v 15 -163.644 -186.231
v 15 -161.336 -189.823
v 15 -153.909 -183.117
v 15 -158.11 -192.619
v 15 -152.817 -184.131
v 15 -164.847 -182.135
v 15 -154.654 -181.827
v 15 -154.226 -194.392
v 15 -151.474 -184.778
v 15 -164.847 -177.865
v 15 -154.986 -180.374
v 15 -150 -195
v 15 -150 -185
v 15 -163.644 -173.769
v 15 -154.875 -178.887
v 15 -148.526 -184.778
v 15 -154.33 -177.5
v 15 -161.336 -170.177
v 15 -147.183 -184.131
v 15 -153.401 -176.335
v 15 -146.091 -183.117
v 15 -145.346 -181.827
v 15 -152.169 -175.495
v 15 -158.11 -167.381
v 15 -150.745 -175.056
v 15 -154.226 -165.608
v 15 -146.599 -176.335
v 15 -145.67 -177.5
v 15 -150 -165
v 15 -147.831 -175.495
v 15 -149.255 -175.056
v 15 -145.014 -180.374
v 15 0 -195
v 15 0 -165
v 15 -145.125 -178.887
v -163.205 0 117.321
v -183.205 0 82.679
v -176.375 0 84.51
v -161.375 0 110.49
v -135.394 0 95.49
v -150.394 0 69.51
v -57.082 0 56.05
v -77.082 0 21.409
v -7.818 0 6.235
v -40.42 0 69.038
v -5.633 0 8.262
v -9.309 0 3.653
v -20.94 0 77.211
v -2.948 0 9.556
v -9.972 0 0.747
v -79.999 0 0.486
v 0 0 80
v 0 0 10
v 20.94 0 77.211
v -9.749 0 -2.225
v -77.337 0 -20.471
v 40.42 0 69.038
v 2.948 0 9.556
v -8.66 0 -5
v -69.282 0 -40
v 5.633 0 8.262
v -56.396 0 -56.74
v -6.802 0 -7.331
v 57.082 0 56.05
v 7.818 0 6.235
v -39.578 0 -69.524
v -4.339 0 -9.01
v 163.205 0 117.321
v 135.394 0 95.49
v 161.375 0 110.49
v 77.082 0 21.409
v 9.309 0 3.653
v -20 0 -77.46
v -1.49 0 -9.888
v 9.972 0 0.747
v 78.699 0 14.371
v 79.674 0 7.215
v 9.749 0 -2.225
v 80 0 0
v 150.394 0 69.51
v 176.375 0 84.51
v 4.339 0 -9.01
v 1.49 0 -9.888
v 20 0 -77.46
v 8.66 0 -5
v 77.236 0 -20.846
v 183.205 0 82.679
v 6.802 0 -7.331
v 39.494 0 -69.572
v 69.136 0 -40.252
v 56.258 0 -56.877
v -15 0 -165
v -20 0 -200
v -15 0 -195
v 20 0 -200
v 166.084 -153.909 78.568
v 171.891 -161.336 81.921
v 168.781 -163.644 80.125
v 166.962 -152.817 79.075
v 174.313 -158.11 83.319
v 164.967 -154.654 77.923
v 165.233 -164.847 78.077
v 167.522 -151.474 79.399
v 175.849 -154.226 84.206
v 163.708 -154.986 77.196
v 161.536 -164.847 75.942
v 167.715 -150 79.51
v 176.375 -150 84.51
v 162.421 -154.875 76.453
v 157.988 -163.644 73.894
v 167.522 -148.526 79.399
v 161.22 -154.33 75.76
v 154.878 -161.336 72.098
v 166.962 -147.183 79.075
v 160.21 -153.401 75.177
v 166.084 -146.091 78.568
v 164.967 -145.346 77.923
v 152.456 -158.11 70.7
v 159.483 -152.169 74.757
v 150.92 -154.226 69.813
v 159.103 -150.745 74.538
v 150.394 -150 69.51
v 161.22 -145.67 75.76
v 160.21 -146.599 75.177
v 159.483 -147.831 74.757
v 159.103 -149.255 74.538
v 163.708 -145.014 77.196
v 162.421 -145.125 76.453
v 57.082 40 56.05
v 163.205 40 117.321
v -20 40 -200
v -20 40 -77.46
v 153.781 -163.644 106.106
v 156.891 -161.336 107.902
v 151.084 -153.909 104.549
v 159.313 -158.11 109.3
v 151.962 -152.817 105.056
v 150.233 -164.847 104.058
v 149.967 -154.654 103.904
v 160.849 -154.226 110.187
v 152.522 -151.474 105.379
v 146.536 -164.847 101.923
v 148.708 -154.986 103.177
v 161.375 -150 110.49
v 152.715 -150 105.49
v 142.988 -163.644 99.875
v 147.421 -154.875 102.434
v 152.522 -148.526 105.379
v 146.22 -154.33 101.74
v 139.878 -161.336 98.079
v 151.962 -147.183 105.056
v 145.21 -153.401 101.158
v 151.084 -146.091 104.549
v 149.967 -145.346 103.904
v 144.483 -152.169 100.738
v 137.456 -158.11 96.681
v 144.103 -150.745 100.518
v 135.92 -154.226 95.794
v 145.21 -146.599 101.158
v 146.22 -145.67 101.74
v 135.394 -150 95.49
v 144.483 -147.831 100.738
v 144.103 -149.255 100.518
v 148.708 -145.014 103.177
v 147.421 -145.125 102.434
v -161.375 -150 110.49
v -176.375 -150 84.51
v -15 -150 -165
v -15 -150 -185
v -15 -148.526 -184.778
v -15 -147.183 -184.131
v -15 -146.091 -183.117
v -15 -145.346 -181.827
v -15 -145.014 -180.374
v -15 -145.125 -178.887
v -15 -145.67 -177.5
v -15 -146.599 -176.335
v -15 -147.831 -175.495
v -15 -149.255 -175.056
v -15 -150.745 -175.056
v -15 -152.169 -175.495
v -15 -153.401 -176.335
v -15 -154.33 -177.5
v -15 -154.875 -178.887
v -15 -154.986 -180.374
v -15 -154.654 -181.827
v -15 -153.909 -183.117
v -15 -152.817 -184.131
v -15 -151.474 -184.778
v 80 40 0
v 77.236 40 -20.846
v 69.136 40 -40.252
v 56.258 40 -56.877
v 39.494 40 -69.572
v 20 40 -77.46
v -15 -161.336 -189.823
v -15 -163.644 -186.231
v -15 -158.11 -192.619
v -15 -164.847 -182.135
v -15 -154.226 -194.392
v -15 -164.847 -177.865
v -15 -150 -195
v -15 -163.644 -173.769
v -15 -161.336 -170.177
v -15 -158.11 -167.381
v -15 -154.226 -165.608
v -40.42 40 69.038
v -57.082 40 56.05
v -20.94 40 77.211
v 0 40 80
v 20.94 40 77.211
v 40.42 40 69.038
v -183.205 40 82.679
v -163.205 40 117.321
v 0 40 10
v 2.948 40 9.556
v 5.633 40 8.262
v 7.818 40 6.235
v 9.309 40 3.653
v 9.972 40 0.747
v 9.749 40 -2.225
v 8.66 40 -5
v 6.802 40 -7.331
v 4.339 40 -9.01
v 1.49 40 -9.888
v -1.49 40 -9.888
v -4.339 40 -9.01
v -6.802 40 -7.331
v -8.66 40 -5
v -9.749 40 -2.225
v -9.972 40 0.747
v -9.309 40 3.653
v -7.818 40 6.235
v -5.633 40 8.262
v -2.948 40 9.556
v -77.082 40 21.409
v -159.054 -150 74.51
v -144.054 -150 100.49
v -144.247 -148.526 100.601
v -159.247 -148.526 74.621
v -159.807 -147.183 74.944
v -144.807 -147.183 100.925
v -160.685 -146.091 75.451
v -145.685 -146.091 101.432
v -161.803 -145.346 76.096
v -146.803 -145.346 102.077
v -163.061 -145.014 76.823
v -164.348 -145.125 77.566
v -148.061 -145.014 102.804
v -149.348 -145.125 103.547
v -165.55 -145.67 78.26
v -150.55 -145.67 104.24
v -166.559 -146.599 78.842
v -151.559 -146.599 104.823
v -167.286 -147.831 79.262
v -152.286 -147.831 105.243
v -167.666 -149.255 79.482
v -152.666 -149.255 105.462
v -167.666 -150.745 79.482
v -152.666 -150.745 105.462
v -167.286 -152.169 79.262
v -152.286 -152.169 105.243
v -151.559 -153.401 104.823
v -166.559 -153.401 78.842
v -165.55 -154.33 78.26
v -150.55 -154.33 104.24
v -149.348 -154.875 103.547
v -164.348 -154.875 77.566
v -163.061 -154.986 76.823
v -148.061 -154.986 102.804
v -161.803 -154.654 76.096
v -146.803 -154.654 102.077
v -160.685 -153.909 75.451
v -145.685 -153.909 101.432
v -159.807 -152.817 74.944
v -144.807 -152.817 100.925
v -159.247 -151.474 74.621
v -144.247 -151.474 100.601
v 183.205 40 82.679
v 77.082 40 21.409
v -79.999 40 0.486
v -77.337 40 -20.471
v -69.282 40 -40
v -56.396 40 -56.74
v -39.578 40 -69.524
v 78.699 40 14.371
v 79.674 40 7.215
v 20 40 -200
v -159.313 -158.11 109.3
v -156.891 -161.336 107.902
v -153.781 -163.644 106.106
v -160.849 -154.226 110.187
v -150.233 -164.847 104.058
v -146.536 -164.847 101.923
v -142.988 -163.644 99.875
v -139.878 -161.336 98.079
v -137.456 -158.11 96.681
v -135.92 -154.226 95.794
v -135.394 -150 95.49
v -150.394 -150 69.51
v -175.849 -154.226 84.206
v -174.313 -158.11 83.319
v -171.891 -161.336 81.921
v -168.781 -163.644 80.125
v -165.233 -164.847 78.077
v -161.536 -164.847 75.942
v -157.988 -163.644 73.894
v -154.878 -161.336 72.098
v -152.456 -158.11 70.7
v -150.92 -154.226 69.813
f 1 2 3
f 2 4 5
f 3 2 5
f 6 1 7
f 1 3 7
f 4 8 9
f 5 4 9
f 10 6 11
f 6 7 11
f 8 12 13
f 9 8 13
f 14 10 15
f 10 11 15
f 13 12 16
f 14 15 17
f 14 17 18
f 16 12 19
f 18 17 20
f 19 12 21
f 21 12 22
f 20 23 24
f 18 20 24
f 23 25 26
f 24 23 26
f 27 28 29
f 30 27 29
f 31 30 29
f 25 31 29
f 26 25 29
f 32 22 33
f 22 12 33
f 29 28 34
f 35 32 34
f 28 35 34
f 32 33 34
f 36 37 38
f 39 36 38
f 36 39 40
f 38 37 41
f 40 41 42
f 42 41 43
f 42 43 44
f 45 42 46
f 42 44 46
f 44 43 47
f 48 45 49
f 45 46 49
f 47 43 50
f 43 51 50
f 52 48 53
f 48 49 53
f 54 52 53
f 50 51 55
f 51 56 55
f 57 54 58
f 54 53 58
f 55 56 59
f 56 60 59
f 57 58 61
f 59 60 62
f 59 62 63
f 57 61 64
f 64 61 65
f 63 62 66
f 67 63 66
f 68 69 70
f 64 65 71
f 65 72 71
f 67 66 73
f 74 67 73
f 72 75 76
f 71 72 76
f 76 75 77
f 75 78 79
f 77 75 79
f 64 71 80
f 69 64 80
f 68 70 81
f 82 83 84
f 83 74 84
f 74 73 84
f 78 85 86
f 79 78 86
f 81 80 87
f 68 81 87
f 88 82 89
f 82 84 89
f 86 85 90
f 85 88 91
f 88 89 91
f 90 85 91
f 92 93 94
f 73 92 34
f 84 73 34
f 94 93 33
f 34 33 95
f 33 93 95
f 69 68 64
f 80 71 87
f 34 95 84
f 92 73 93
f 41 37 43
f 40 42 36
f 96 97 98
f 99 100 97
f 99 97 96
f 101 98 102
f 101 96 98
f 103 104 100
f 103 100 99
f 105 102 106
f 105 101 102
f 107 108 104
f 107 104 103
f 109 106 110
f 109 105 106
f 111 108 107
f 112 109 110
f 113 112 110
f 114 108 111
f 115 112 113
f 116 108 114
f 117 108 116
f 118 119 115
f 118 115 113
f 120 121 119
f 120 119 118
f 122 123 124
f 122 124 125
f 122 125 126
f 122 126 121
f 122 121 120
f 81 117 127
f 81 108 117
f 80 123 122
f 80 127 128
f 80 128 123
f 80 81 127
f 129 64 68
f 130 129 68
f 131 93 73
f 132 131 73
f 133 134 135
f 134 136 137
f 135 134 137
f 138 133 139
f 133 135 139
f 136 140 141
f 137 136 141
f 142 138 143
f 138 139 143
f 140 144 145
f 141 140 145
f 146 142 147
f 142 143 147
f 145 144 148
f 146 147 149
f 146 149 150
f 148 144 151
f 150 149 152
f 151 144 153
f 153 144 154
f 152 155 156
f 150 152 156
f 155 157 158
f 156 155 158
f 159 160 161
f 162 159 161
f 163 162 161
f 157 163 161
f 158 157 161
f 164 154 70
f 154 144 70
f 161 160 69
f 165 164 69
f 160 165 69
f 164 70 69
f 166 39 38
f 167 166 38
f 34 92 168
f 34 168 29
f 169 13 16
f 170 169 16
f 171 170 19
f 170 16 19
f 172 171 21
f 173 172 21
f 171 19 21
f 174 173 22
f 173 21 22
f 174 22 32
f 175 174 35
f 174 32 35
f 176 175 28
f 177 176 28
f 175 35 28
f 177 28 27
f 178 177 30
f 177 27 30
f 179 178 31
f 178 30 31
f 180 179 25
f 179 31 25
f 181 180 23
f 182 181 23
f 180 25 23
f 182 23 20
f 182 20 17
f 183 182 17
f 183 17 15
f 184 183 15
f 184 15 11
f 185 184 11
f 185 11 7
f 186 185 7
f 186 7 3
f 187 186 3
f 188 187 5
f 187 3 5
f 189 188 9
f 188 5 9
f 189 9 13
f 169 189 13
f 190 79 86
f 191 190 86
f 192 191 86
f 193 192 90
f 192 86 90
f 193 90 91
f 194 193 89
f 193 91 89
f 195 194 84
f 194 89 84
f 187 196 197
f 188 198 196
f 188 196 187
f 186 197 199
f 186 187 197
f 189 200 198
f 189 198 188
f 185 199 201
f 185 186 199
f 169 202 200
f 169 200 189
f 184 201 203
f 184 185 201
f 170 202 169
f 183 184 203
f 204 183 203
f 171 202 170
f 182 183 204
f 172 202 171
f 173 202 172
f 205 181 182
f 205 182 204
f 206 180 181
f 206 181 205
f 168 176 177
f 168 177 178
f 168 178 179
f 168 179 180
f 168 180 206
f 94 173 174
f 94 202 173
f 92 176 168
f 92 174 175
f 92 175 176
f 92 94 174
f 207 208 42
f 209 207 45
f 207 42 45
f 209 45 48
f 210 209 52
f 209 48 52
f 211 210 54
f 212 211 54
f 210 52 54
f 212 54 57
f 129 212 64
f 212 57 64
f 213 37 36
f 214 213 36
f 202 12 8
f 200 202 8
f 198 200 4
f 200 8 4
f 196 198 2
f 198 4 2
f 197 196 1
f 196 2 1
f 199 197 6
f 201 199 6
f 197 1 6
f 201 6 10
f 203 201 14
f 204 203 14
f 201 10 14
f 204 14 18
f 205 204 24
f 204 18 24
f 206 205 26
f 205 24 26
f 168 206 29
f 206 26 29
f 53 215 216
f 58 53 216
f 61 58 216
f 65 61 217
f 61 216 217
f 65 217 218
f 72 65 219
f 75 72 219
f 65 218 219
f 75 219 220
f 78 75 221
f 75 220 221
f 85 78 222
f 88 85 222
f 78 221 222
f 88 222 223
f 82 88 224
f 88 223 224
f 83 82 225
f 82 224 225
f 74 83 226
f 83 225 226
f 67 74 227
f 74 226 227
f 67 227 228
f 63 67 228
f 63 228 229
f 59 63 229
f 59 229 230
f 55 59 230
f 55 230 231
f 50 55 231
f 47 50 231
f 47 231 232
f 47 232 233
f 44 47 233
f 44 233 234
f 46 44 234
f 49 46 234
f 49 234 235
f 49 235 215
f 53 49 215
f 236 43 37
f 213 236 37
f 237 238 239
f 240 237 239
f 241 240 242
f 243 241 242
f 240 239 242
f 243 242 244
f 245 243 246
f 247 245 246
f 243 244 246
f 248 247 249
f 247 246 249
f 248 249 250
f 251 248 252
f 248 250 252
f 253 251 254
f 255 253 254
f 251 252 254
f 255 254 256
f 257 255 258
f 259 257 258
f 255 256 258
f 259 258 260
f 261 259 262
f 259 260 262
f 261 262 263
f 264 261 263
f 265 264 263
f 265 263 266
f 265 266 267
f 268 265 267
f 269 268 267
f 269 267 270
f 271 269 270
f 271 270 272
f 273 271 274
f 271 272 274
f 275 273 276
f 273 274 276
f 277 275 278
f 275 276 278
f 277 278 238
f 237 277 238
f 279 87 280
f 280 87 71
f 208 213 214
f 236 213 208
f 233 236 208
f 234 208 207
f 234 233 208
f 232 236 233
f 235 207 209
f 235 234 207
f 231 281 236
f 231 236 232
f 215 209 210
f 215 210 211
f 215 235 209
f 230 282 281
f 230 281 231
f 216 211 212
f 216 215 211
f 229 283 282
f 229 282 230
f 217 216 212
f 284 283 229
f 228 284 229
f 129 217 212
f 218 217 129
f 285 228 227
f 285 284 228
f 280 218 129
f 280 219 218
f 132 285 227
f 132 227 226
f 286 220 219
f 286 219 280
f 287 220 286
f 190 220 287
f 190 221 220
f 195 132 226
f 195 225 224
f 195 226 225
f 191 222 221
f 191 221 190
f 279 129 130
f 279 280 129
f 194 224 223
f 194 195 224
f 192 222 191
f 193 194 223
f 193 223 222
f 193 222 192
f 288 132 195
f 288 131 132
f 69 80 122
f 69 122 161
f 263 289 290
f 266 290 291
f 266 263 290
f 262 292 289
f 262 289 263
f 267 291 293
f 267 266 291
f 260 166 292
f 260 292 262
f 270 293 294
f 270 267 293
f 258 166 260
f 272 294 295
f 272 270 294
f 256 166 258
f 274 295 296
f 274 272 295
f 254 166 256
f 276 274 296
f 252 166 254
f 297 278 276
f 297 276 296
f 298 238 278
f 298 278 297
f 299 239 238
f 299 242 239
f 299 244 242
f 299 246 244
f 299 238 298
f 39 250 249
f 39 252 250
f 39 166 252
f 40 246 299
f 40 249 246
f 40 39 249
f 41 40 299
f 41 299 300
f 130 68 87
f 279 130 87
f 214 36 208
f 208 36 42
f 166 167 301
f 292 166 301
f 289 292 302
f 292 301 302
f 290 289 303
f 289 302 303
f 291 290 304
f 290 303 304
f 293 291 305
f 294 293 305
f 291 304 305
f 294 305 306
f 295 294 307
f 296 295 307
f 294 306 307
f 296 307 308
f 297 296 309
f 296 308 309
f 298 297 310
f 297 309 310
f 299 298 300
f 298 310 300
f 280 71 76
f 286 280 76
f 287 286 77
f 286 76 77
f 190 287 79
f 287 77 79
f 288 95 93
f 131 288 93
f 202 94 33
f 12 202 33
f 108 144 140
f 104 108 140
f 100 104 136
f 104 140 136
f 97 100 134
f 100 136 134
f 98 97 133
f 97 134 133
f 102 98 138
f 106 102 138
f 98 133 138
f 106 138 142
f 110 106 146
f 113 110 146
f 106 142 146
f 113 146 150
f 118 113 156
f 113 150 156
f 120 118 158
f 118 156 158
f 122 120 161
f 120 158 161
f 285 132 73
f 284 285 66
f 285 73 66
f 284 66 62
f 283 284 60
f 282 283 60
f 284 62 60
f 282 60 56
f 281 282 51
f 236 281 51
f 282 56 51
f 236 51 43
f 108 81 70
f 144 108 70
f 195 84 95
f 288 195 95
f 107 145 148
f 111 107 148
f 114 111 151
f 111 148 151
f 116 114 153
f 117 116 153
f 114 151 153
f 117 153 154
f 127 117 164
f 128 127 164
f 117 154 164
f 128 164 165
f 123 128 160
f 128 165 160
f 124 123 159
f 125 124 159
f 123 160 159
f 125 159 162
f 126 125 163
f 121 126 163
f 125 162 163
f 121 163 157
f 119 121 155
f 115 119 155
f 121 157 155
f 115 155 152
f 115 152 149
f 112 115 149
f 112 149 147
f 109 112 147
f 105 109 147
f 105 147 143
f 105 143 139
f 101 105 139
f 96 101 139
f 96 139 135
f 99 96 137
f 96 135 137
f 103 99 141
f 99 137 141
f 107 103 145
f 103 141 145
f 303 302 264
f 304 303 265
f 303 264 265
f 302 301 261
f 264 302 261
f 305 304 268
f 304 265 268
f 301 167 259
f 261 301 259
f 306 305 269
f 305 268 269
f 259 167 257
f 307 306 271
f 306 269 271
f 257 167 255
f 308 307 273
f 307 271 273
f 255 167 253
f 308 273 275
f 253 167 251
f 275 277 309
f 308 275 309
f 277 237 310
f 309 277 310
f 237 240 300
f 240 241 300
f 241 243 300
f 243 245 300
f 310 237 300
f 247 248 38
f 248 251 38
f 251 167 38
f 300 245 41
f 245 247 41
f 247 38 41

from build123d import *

# Parameters (mm, degrees)
BOSS_EXTRUDE1_DEPTH = 40
SKETCH2_W           = 30
SKETCH2_H           = 30
BOSS_EXTRUDE2_DEPTH = 150
BOSS_EXTRUDE4_DEPTH = 30
SKETCH5_R           = 5
CUT_EXTRUDE2_DEPTH  = 30
CIRPATTERN1_COUNT   = 3
SKETCH6_R           = 10
CUT_EXTRUDE3_DEPTH  = 50
SKETCH7_R           = 5
CUT_EXTRUDE4_DEPTH  = 30
SKETCH8_R           = 5
CUT_EXTRUDE5_DEPTH  = 30


with BuildPart() as part:
    # Sketch1 → Boss-Extrude1 (new body)
    with BuildSketch(Plane(origin=(0, 0, 0), x_dir=(1, 0, 0), z_dir=(0, 1, 0))):
        with BuildLine():
            ThreePointArc((-57.082039325, -56.050341538), (0, -80), (57.082039325, -56.050341538))
            ThreePointArc((57.082039325, -56.050341538), (69.282032303, -40), (77.082039325, -21.409325386))
            ThreePointArc((77.082039325, -21.409325386), (79.267153178, -10.80363027), (80, 0))
            ThreePointArc((80, 0), (63.245553203, 48.989794856), (20, 77.459666924))
            ThreePointArc((20, 77.459666924), (0, 80), (-20, 77.459666924))
            ThreePointArc((-20, 77.459666924), (-69.282032303, 40), (-77.082039325, -21.409325386))
            ThreePointArc((-77.082039325, -21.409325386), (-69.282032303, -40), (-57.082039325, -56.050341538))
        make_face()
        with BuildLine():
            ThreePointArc((-20, 77.459666924), (0, 80), (20, 77.459666924))
            Line((20, 77.459666924), (20, 200))
            Line((20, 200), (-20, 200))
            Line((-20, 200), (-20, 77.459666924))
        make_face()
        with BuildLine():
            Line((-163.205080757, -117.320508076), (-57.082039325, -56.050341538))
            ThreePointArc((-57.082039325, -56.050341538), (-69.282032303, -40), (-77.082039325, -21.409325386))
            Line((-77.082039325, -21.409325386), (-183.205080757, -82.679491924))
            Line((-183.205080757, -82.679491924), (-163.205080757, -117.320508076))
        make_face()
        with BuildLine():
            Line((57.082039325, -56.050341538), (163.205080757, -117.320508076))
            Line((163.205080757, -117.320508076), (183.205080757, -82.679491924))
            Line((183.205080757, -82.679491924), (77.082039325, -21.409325386))
            ThreePointArc((77.082039325, -21.409325386), (69.282032303, -40), (57.082039325, -56.050341538))
        make_face()
    extrude(amount=BOSS_EXTRUDE1_DEPTH)

    # Sketch2 → Boss-Extrude2 (add)
    with BuildSketch(Plane.XZ):
        with Locations((0, -180)):
            Rectangle(SKETCH2_W, SKETCH2_H)
    boss_extrude2 = extrude(amount=BOSS_EXTRUDE2_DEPTH)

    # Sketch3 → Boss-Extrude4 (add)
    with BuildSketch(Plane(origin=(15, 0, 0), x_dir=(0, 0, -1), z_dir=(1, 0, 0))):
        with BuildLine():
            Line((165, -150), (195, -150))
            ThreePointArc((195, -150), (180, -165), (165, -150))
        make_face()
    boss_extrude4 = extrude(amount=-BOSS_EXTRUDE4_DEPTH)

    # Sketch5 → Cut-Extrude2 (cut)
    with BuildSketch(Plane(origin=(15, 0, 0), x_dir=(0, 0, -1), z_dir=(1, 0, 0))):
        with Locations((180, -150)):
            Circle(SKETCH5_R)
    extrude(amount=-CUT_EXTRUDE2_DEPTH, mode=Mode.SUBTRACT)

    # CirPattern1: Boss-Extrude2, Boss-Extrude4 ×3 about axis
    cirpattern1_axis = Axis((0, 0, 0), (0, 1, 0))
    add([boss_extrude2.rotate(cirpattern1_axis, i * 360 / CIRPATTERN1_COUNT) for i in range(1, CIRPATTERN1_COUNT)])
    add([boss_extrude4.rotate(cirpattern1_axis, i * 360 / CIRPATTERN1_COUNT) for i in range(1, CIRPATTERN1_COUNT)])

    # Sketch6 → Cut-Extrude3 (cut)
    with BuildSketch(Plane(origin=(0, 40, 0), x_dir=(1, 0, 0), z_dir=(0, 1, 0))):
        with Locations(Location((0, 0, 0), (0, 0, 270))):
            Circle(SKETCH6_R)
    extrude(amount=-CUT_EXTRUDE3_DEPTH, mode=Mode.SUBTRACT)

    # Sketch7 → Cut-Extrude4 (cut)
    with BuildSketch(Plane(origin=(7.5, 0, 12.990381057), x_dir=(0.8660254037844434, 0, -0.49999999999999195), z_dir=(0.49999999999999195, 0, 0.8660254037844434))):
        with Locations((-180, -150)):
            Circle(SKETCH7_R)
    extrude(amount=-CUT_EXTRUDE4_DEPTH, mode=Mode.SUBTRACT)

    # Sketch8 → Cut-Extrude5 (cut)
    with BuildSketch(Plane(origin=(-7.5, 0, 12.990381057), x_dir=(0.8660254037844364, 0, 0.5000000000000041), z_dir=(-0.500000000000004, 0, 0.8660254037844363))):
        with Locations((180, -150)):
            Circle(SKETCH8_R)
    extrude(amount=-CUT_EXTRUDE5_DEPTH, mode=Mode.SUBTRACT)


solid = part.part
